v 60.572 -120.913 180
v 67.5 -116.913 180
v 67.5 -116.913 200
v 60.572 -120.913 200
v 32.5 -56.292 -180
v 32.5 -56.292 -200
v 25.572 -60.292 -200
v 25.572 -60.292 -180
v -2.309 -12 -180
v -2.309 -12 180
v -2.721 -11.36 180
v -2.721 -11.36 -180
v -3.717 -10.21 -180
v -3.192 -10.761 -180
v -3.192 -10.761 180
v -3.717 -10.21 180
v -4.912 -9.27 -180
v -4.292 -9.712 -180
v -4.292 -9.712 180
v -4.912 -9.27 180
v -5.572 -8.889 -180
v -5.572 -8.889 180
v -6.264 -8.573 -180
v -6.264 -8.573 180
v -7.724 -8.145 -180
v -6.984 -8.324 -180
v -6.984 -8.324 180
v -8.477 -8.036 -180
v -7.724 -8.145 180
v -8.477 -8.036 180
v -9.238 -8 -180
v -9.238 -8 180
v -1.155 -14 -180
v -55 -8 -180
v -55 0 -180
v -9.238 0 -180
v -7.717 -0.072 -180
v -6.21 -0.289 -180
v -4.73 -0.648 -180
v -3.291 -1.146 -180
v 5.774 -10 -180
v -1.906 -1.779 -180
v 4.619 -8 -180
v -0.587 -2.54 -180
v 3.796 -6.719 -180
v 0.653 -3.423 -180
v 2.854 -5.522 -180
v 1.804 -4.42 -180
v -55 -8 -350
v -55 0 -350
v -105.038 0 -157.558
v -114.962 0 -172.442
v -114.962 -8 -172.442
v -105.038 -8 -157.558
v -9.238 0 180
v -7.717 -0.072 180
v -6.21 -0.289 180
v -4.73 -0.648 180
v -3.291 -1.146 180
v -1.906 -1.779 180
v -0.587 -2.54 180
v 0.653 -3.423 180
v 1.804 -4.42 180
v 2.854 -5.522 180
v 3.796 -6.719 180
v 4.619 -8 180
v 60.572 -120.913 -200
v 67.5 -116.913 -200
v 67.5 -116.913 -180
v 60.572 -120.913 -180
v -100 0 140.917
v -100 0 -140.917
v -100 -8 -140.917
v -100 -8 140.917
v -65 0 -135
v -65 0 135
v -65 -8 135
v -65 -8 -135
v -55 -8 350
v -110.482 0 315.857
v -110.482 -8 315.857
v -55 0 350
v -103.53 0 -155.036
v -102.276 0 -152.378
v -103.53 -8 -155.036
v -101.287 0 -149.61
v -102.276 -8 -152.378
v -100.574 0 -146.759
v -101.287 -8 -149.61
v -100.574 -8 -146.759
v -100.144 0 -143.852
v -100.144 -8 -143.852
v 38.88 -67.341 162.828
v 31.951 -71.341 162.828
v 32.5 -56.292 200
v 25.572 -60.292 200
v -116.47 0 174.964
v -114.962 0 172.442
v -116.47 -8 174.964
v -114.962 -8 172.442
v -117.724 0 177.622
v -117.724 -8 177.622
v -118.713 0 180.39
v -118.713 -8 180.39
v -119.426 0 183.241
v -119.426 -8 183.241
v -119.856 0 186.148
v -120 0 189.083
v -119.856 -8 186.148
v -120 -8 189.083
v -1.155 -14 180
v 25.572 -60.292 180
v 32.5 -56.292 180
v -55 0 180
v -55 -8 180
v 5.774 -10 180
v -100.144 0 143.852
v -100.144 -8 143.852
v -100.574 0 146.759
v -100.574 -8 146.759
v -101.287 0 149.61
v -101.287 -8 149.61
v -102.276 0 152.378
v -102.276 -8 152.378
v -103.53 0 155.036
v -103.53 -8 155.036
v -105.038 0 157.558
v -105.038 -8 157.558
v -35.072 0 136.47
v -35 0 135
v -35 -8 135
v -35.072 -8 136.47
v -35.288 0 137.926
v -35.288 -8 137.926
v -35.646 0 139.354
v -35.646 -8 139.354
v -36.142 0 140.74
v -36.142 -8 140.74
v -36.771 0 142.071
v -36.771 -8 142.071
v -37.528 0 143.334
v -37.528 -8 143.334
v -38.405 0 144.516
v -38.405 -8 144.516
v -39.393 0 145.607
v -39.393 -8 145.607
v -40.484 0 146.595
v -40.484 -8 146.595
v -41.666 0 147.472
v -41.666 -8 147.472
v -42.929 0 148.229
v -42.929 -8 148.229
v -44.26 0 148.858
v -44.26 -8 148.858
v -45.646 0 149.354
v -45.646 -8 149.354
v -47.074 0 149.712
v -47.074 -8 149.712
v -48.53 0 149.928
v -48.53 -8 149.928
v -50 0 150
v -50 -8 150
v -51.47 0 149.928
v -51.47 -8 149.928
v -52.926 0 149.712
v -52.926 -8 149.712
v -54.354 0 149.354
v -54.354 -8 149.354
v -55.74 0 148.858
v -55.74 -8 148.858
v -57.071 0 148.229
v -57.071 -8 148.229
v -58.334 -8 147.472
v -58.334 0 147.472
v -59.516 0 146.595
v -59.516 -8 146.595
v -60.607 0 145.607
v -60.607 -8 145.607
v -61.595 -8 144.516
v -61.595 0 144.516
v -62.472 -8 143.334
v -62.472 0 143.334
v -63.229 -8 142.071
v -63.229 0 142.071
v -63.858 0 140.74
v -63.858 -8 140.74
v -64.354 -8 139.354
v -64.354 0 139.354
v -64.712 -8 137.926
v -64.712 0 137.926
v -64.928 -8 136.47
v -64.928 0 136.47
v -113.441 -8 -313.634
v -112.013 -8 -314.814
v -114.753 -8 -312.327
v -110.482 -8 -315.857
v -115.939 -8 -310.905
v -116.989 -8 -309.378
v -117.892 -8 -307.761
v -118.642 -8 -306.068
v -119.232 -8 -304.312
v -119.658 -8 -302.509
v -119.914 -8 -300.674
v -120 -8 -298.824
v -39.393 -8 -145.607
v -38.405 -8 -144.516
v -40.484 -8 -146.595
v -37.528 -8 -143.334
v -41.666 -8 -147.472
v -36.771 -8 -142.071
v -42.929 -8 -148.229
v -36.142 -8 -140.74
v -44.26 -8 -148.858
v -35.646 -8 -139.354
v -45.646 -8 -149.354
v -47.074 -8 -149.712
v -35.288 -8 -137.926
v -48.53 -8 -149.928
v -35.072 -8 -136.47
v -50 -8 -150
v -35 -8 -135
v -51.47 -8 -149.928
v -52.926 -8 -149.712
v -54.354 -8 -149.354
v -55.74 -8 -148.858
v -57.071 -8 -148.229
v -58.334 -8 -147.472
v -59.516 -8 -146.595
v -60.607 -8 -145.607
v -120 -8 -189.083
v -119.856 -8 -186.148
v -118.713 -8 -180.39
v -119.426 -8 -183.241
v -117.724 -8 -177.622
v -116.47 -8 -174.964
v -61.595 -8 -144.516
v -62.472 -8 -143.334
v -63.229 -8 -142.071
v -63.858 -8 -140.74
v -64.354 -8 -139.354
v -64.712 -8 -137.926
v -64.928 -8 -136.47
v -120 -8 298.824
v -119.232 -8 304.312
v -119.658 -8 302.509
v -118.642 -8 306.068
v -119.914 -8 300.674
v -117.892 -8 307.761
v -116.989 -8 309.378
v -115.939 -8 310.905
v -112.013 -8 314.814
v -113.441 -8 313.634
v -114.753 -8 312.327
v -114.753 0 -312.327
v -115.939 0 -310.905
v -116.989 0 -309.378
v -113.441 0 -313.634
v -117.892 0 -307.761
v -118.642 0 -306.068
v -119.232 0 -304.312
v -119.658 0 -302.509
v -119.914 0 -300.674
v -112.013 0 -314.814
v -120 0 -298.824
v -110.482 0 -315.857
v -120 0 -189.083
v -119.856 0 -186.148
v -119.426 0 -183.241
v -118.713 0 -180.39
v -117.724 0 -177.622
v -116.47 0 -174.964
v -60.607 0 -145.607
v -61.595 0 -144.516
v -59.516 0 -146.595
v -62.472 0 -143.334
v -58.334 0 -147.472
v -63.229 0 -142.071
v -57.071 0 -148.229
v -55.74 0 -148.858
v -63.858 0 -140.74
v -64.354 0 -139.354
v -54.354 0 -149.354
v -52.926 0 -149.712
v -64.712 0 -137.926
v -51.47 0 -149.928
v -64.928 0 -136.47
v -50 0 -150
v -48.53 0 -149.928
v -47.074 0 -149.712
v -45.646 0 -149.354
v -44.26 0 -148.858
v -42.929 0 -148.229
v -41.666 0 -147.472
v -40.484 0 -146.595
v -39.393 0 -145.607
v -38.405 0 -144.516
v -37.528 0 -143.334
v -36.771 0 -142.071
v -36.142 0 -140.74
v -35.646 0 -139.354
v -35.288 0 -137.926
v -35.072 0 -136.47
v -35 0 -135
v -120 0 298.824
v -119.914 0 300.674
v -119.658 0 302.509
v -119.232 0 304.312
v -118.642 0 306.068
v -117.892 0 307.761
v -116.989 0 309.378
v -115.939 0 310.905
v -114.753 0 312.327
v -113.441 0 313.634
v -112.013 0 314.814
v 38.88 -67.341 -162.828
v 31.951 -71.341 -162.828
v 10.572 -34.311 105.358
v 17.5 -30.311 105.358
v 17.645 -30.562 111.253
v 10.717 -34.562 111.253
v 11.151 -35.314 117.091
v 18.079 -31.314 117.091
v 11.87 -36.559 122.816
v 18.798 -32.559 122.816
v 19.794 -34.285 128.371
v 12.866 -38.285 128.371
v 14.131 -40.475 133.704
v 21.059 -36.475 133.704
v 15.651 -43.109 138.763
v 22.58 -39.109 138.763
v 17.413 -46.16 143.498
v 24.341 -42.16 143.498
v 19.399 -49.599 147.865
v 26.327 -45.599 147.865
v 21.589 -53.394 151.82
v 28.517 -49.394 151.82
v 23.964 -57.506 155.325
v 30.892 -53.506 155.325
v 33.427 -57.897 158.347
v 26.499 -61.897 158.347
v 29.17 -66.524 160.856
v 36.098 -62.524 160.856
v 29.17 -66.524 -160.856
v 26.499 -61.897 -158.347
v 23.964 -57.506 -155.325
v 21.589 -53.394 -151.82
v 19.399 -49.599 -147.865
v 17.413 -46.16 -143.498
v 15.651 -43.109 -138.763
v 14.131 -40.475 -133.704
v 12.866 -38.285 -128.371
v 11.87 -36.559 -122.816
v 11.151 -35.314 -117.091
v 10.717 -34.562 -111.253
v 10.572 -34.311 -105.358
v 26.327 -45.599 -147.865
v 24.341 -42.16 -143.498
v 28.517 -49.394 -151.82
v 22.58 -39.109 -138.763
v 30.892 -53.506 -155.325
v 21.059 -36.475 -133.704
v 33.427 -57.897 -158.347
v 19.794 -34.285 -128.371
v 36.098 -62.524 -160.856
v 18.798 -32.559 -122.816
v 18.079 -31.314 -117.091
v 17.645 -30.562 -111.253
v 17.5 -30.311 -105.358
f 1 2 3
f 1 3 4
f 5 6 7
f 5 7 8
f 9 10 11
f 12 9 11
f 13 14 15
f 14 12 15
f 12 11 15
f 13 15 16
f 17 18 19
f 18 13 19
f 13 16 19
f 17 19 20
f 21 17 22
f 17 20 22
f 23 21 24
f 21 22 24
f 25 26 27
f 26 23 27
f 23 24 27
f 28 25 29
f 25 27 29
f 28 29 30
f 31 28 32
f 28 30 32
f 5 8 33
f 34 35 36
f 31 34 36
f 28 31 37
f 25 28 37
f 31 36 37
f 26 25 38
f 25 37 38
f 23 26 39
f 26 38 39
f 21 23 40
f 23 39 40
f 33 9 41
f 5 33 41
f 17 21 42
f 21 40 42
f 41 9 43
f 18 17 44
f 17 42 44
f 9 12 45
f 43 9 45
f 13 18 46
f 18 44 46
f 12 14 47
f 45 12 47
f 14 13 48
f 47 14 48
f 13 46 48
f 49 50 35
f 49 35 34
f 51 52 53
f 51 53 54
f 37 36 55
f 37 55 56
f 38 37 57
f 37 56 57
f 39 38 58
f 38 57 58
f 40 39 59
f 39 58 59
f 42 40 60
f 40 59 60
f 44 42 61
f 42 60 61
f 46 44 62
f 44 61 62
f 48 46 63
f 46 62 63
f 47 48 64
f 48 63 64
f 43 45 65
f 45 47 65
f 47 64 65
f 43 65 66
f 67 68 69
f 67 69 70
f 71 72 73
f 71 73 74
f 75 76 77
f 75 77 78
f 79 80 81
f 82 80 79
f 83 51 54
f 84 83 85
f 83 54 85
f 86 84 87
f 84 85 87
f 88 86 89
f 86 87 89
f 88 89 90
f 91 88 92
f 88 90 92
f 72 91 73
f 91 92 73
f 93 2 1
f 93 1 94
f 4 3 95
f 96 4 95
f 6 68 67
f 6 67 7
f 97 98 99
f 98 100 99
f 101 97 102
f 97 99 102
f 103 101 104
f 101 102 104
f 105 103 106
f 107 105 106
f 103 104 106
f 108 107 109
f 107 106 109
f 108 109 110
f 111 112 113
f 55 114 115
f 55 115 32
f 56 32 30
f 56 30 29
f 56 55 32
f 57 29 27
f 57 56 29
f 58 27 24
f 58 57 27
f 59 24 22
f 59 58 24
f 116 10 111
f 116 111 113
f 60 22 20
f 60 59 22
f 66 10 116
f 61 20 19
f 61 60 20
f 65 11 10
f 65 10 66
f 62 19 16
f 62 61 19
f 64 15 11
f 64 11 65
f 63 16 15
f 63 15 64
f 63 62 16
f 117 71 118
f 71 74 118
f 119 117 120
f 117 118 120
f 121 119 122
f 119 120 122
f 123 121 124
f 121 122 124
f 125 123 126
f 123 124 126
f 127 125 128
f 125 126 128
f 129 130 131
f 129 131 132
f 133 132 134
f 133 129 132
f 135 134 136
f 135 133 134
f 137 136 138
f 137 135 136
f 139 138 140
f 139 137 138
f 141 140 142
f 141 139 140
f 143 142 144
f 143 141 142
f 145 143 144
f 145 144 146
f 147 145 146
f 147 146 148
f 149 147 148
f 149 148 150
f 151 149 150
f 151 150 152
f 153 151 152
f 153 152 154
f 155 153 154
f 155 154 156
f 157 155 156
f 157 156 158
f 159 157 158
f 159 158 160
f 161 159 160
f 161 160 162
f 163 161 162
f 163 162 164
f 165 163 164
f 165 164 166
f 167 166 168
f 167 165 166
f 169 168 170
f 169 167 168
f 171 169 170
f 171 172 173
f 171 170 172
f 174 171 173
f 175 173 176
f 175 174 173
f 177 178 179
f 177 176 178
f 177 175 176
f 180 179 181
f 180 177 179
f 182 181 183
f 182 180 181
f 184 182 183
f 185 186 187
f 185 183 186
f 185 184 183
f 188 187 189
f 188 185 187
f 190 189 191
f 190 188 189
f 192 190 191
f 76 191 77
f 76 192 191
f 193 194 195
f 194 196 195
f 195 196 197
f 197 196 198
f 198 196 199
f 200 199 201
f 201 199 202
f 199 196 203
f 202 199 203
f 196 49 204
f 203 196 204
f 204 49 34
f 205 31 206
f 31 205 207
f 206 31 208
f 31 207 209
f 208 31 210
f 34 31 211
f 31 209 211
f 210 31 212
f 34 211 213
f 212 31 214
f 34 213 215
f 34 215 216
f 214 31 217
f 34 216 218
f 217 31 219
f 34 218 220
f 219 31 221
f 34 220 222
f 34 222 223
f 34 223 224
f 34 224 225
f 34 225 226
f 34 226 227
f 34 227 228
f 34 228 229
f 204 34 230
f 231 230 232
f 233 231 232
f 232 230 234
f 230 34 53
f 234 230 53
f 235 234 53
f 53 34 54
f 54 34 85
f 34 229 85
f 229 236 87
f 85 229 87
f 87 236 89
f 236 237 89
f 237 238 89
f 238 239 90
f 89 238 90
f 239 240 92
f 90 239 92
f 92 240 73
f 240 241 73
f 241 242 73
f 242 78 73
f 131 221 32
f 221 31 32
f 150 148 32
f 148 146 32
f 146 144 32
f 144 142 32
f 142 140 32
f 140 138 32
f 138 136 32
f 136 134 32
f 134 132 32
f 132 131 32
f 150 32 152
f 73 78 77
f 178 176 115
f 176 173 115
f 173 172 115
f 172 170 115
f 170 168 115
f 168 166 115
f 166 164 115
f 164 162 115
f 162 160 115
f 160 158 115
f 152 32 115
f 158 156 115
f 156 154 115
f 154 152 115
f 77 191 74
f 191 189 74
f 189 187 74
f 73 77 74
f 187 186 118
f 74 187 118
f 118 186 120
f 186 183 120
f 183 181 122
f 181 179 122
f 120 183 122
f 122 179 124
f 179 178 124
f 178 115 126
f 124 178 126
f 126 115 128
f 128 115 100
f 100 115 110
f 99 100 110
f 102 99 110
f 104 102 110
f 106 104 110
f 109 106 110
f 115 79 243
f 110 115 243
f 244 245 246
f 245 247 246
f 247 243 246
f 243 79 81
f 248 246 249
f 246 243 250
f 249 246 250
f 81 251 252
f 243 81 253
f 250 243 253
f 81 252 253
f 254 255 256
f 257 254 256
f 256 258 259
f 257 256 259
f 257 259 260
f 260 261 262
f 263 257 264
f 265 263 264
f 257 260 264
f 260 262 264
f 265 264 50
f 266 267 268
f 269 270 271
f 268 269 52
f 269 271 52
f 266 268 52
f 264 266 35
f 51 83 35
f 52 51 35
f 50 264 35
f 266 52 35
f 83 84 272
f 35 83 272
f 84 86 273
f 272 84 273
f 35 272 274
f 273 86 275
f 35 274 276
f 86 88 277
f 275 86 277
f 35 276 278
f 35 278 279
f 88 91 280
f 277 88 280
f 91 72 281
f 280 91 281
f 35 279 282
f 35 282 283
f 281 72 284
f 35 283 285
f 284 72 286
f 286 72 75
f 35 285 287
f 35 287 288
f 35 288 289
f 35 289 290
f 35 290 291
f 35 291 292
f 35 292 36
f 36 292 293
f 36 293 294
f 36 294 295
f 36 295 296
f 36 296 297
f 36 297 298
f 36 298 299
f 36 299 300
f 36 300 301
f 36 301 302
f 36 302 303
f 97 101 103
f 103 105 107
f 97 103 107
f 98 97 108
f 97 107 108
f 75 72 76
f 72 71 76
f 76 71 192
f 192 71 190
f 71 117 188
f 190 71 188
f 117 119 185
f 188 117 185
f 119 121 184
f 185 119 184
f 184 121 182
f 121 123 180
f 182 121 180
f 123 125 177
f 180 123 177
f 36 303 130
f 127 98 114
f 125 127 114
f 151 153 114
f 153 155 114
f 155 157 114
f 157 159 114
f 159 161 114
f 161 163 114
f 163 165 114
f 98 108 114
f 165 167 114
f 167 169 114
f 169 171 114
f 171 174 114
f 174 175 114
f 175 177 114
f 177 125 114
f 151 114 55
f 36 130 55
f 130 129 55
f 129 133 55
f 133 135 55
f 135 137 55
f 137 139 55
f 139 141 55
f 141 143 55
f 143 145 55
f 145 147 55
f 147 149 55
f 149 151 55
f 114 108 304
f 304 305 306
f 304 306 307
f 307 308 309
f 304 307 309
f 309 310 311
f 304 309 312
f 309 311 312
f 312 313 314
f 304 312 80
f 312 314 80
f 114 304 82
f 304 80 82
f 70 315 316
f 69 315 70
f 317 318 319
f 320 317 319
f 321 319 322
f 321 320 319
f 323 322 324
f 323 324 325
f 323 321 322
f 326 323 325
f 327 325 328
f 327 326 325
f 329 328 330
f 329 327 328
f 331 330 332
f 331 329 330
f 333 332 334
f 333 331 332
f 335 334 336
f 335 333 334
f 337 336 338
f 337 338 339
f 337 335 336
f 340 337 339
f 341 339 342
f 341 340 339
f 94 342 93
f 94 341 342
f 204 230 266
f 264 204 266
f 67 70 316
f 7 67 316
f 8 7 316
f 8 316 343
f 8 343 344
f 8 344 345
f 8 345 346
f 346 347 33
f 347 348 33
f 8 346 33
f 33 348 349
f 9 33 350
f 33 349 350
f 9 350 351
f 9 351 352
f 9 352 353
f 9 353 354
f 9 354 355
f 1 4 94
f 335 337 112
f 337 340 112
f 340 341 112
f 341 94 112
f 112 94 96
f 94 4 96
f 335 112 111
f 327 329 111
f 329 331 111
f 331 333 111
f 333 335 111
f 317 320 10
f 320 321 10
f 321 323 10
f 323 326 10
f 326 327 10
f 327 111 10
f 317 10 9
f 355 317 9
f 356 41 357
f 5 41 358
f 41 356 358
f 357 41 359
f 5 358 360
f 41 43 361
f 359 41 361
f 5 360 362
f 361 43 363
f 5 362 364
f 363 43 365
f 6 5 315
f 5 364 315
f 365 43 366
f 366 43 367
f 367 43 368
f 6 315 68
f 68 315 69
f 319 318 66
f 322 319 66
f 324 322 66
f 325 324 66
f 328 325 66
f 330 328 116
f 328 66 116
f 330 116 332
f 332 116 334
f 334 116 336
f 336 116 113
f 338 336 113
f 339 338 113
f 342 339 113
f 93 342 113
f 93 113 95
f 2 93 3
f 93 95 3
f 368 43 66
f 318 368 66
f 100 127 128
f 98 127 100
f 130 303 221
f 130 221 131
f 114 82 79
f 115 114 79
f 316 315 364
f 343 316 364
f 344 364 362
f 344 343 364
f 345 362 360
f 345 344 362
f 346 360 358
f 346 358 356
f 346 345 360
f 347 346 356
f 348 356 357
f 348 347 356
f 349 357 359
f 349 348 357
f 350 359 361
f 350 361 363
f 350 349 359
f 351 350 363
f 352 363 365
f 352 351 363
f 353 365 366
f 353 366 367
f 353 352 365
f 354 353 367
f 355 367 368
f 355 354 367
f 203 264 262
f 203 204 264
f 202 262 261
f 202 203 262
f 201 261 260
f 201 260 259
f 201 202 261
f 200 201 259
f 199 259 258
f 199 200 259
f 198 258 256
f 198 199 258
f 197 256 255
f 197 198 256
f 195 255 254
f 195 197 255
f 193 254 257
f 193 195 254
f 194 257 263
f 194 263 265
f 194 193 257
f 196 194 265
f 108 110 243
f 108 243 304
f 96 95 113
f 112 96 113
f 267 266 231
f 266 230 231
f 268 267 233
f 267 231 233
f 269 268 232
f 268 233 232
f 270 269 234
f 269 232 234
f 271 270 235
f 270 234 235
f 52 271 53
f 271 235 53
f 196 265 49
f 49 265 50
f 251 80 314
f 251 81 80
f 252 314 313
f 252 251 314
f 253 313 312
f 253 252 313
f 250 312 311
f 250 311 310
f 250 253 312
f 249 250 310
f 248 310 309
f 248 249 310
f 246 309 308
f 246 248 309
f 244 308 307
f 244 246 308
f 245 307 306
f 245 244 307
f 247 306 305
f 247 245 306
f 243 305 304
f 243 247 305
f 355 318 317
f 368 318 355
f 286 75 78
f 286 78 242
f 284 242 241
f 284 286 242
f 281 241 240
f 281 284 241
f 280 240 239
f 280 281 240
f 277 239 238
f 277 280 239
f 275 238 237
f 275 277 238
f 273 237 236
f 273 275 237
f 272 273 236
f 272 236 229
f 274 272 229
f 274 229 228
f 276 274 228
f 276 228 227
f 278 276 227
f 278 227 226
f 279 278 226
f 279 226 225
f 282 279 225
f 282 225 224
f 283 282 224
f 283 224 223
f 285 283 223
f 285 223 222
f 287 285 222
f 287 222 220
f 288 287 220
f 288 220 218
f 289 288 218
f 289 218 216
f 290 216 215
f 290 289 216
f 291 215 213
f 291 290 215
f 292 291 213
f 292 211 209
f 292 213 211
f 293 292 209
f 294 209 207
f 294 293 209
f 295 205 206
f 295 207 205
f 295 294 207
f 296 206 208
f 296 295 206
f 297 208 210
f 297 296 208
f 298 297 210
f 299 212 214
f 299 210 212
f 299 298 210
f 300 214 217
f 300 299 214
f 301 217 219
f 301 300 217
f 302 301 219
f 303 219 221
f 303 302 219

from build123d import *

# Parameters (mm, degrees)
SM_BASE_FLANGE_1_DEPTH = 350
CUT_EXTRUDE_1_DEPTH    = 10
CUT_EXTRUDE_2_DEPTH    = 10
CUT_EXTRUDE_START      = 180
CUT_EXTRUDE_3_DEPTH    = 170
CUT_EXTRUDE_4_DEPTH    = 10
SKETCH_10_W            = 150
SKETCH_10_H            = 123.452994616
CUT_EXTRUDE_5_DEPTH    = 10
SKETCH_11_W            = 20
SKETCH_11_H            = 53.452994616
CUT_EXTRUDE_6_DEPTH    = 10
CUT_EXTRUDE_7_DEPTH    = 10
FILLET_1_R             = 60
FILLET_2_R             = 30
FILLET_3_R             = 20


# Read off the part's stored shape, not the designer's step: 切除-拉伸3
# Sheet-metal steps are written as plain solids
with BuildPart() as part:
    # Sketch 1 → 基体-法兰1 (new, symmetric)
    with BuildSketch(Plane.XY):
        with BuildLine():
            Line((-120, 0), (-9.237604307, 0))
            ThreePointArc((-9.237604307, 0), (-1.237604307, -2.143593539), (4.618802154, -8))
            Line((4.618802154, -8), (67.5, -116.913429511))
            Line((67.5, -116.913429511), (60.57179677, -120.913429511))
            Line((60.57179677, -120.913429511), (-2.309401077, -12))
            ThreePointArc((-2.309401077, -12), (-5.237604307, -9.07179677), (-9.237604307, -8))
            Line((-9.237604307, -8), (-120, -8))
            Line((-120, -8), (-120, 0))
        make_face()
    extrude(amount=SM_BASE_FLANGE_1_DEPTH, both=True)

    # 草图6 → 切除-拉伸1 (cut)
    with BuildSketch(Plane(origin=(0, 0, 0), x_dir=(1, 0, 0), z_dir=(0, 1, 0))):
        Polygon((-120, -180), (-120, 180), (-100, 150), (-100, -150), align=None)
    extrude(amount=-CUT_EXTRUDE_1_DEPTH, mode=Mode.SUBTRACT)

    # 草图7 → 切除-拉伸2 (cut)
    with BuildSketch(Plane(origin=(0, 0, 0), x_dir=(1, 0, 0), z_dir=(0, 1, 0))):
        with BuildLine():
            Line((-65, -135), (-65, 135))
            ThreePointArc((-65, 135), (-50, 150), (-35, 135))
            Line((-35, 135), (-35, -135))
            ThreePointArc((-35, -135), (-50, -150), (-65, -135))
        make_face()
    extrude(amount=-CUT_EXTRUDE_2_DEPTH, mode=Mode.SUBTRACT)

    # 切除-拉伸3 outline → 切除-拉伸3 (cut)
    with BuildSketch(Plane.XY.offset(CUT_EXTRUDE_START)):
        with BuildLine():
            Line((-2.309401077, -12), (-1.154700538, -14))
            Line((-1.154700538, -14), (5.773502692, -10))
            Line((5.773502692, -10), (4.618802154, -8))
            ThreePointArc((4.618802154, -8), (-1.237604307, -2.143593539), (-9.237604307, 0))
            Line((-9.237604307, 0), (-55, 0))
            Line((-55, 0), (-55, -8))
            Line((-55, -8), (-9.237604307, -8))
            ThreePointArc((-9.237604307, -8), (-5.237604307, -9.07179677), (-2.309401077, -12))
        make_face()
    cut_extrude_3 = extrude(amount=CUT_EXTRUDE_3_DEPTH, mode=Mode.SUBTRACT)

    # 草图9 → 切除-拉伸4 (cut)
    with BuildSketch(Plane(origin=(0, 0, 0), x_dir=(1, 0, 0), z_dir=(0, 1, 0))):
        Polygon((-120, -350), (-120, -310), (-55, -350), align=None)
    cut_extrude_4 = extrude(amount=-CUT_EXTRUDE_4_DEPTH, mode=Mode.SUBTRACT)

    # 草图10 → 切除-拉伸5 (cut)
    with BuildSketch(Plane(origin=(0, 0, 0), x_dir=(0, 0, -1), z_dir=(0.8660254037844398, 0.49999999999999806, 0))):
        with Locations((-275, -73.273502692)):
            Rectangle(SKETCH_10_W, SKETCH_10_H)
    cut_extrude_5 = extrude(amount=-CUT_EXTRUDE_5_DEPTH, mode=Mode.SUBTRACT)

    # 草图11 → 切除-拉伸6 (cut)
    with BuildSketch(Plane(origin=(0, 0, 0), x_dir=(0, 0, -1), z_dir=(0.8660254037844398, 0.49999999999999806, 0))):
        with Locations((-190, -38.273502692)):
            Rectangle(SKETCH_11_W, SKETCH_11_H)
    cut_extrude_6 = extrude(amount=-CUT_EXTRUDE_6_DEPTH, mode=Mode.SUBTRACT)

    # 镜向1: 切除-拉伸4, 切除-拉伸5 across plane
    add(cut_extrude_4.mirror(Plane.XY), mode=Mode.SUBTRACT)
    add(cut_extrude_5.mirror(Plane.XY), mode=Mode.SUBTRACT)

    # 镜向2: 切除-拉伸3 across plane
    add(cut_extrude_3.mirror(Plane.XY), mode=Mode.SUBTRACT)

    # 镜向3: 切除-拉伸6 across plane
    add(cut_extrude_6.mirror(Plane.XY), mode=Mode.SUBTRACT)

    # 草图12 → 切除-拉伸7 (cut)
    with BuildSketch(Plane(origin=(0, 0, 0), x_dir=(0, 0, -1), z_dir=(0.8660254037844398, 0.49999999999999806, 0))):
        Polygon((-150, -35), (150, -35), (180, -135), (-180, -135), align=None)
    extrude(amount=-CUT_EXTRUDE_7_DEPTH, mode=Mode.SUBTRACT)

    # 圆角1
    fillet_1_edges = [part.edges().sort_by_distance(p)[0] for p in [
        (14.035898385, -32.310889132, 150),
        (14.035898385, -32.310889132, -150),
    ]]
    fillet(fillet_1_edges, radius=FILLET_1_R)

    # 圆角2
    fillet_2_edges = [part.edges().sort_by_distance(p)[0] for p in [
        (-120, -4, -180),
        (-100, -4, -150),
        (-100, -4, 150),
        (-120, -4, 180),
    ]]
    fillet(fillet_2_edges, radius=FILLET_2_R)

    # 圆角3
    fillet_3_edges = [part.edges().sort_by_distance(p)[0] for p in [
        (-120, -4, 310),
        (-120, -4, -310),
    ]]
    fillet(fillet_3_edges, radius=FILLET_3_R)


solid = part.part
